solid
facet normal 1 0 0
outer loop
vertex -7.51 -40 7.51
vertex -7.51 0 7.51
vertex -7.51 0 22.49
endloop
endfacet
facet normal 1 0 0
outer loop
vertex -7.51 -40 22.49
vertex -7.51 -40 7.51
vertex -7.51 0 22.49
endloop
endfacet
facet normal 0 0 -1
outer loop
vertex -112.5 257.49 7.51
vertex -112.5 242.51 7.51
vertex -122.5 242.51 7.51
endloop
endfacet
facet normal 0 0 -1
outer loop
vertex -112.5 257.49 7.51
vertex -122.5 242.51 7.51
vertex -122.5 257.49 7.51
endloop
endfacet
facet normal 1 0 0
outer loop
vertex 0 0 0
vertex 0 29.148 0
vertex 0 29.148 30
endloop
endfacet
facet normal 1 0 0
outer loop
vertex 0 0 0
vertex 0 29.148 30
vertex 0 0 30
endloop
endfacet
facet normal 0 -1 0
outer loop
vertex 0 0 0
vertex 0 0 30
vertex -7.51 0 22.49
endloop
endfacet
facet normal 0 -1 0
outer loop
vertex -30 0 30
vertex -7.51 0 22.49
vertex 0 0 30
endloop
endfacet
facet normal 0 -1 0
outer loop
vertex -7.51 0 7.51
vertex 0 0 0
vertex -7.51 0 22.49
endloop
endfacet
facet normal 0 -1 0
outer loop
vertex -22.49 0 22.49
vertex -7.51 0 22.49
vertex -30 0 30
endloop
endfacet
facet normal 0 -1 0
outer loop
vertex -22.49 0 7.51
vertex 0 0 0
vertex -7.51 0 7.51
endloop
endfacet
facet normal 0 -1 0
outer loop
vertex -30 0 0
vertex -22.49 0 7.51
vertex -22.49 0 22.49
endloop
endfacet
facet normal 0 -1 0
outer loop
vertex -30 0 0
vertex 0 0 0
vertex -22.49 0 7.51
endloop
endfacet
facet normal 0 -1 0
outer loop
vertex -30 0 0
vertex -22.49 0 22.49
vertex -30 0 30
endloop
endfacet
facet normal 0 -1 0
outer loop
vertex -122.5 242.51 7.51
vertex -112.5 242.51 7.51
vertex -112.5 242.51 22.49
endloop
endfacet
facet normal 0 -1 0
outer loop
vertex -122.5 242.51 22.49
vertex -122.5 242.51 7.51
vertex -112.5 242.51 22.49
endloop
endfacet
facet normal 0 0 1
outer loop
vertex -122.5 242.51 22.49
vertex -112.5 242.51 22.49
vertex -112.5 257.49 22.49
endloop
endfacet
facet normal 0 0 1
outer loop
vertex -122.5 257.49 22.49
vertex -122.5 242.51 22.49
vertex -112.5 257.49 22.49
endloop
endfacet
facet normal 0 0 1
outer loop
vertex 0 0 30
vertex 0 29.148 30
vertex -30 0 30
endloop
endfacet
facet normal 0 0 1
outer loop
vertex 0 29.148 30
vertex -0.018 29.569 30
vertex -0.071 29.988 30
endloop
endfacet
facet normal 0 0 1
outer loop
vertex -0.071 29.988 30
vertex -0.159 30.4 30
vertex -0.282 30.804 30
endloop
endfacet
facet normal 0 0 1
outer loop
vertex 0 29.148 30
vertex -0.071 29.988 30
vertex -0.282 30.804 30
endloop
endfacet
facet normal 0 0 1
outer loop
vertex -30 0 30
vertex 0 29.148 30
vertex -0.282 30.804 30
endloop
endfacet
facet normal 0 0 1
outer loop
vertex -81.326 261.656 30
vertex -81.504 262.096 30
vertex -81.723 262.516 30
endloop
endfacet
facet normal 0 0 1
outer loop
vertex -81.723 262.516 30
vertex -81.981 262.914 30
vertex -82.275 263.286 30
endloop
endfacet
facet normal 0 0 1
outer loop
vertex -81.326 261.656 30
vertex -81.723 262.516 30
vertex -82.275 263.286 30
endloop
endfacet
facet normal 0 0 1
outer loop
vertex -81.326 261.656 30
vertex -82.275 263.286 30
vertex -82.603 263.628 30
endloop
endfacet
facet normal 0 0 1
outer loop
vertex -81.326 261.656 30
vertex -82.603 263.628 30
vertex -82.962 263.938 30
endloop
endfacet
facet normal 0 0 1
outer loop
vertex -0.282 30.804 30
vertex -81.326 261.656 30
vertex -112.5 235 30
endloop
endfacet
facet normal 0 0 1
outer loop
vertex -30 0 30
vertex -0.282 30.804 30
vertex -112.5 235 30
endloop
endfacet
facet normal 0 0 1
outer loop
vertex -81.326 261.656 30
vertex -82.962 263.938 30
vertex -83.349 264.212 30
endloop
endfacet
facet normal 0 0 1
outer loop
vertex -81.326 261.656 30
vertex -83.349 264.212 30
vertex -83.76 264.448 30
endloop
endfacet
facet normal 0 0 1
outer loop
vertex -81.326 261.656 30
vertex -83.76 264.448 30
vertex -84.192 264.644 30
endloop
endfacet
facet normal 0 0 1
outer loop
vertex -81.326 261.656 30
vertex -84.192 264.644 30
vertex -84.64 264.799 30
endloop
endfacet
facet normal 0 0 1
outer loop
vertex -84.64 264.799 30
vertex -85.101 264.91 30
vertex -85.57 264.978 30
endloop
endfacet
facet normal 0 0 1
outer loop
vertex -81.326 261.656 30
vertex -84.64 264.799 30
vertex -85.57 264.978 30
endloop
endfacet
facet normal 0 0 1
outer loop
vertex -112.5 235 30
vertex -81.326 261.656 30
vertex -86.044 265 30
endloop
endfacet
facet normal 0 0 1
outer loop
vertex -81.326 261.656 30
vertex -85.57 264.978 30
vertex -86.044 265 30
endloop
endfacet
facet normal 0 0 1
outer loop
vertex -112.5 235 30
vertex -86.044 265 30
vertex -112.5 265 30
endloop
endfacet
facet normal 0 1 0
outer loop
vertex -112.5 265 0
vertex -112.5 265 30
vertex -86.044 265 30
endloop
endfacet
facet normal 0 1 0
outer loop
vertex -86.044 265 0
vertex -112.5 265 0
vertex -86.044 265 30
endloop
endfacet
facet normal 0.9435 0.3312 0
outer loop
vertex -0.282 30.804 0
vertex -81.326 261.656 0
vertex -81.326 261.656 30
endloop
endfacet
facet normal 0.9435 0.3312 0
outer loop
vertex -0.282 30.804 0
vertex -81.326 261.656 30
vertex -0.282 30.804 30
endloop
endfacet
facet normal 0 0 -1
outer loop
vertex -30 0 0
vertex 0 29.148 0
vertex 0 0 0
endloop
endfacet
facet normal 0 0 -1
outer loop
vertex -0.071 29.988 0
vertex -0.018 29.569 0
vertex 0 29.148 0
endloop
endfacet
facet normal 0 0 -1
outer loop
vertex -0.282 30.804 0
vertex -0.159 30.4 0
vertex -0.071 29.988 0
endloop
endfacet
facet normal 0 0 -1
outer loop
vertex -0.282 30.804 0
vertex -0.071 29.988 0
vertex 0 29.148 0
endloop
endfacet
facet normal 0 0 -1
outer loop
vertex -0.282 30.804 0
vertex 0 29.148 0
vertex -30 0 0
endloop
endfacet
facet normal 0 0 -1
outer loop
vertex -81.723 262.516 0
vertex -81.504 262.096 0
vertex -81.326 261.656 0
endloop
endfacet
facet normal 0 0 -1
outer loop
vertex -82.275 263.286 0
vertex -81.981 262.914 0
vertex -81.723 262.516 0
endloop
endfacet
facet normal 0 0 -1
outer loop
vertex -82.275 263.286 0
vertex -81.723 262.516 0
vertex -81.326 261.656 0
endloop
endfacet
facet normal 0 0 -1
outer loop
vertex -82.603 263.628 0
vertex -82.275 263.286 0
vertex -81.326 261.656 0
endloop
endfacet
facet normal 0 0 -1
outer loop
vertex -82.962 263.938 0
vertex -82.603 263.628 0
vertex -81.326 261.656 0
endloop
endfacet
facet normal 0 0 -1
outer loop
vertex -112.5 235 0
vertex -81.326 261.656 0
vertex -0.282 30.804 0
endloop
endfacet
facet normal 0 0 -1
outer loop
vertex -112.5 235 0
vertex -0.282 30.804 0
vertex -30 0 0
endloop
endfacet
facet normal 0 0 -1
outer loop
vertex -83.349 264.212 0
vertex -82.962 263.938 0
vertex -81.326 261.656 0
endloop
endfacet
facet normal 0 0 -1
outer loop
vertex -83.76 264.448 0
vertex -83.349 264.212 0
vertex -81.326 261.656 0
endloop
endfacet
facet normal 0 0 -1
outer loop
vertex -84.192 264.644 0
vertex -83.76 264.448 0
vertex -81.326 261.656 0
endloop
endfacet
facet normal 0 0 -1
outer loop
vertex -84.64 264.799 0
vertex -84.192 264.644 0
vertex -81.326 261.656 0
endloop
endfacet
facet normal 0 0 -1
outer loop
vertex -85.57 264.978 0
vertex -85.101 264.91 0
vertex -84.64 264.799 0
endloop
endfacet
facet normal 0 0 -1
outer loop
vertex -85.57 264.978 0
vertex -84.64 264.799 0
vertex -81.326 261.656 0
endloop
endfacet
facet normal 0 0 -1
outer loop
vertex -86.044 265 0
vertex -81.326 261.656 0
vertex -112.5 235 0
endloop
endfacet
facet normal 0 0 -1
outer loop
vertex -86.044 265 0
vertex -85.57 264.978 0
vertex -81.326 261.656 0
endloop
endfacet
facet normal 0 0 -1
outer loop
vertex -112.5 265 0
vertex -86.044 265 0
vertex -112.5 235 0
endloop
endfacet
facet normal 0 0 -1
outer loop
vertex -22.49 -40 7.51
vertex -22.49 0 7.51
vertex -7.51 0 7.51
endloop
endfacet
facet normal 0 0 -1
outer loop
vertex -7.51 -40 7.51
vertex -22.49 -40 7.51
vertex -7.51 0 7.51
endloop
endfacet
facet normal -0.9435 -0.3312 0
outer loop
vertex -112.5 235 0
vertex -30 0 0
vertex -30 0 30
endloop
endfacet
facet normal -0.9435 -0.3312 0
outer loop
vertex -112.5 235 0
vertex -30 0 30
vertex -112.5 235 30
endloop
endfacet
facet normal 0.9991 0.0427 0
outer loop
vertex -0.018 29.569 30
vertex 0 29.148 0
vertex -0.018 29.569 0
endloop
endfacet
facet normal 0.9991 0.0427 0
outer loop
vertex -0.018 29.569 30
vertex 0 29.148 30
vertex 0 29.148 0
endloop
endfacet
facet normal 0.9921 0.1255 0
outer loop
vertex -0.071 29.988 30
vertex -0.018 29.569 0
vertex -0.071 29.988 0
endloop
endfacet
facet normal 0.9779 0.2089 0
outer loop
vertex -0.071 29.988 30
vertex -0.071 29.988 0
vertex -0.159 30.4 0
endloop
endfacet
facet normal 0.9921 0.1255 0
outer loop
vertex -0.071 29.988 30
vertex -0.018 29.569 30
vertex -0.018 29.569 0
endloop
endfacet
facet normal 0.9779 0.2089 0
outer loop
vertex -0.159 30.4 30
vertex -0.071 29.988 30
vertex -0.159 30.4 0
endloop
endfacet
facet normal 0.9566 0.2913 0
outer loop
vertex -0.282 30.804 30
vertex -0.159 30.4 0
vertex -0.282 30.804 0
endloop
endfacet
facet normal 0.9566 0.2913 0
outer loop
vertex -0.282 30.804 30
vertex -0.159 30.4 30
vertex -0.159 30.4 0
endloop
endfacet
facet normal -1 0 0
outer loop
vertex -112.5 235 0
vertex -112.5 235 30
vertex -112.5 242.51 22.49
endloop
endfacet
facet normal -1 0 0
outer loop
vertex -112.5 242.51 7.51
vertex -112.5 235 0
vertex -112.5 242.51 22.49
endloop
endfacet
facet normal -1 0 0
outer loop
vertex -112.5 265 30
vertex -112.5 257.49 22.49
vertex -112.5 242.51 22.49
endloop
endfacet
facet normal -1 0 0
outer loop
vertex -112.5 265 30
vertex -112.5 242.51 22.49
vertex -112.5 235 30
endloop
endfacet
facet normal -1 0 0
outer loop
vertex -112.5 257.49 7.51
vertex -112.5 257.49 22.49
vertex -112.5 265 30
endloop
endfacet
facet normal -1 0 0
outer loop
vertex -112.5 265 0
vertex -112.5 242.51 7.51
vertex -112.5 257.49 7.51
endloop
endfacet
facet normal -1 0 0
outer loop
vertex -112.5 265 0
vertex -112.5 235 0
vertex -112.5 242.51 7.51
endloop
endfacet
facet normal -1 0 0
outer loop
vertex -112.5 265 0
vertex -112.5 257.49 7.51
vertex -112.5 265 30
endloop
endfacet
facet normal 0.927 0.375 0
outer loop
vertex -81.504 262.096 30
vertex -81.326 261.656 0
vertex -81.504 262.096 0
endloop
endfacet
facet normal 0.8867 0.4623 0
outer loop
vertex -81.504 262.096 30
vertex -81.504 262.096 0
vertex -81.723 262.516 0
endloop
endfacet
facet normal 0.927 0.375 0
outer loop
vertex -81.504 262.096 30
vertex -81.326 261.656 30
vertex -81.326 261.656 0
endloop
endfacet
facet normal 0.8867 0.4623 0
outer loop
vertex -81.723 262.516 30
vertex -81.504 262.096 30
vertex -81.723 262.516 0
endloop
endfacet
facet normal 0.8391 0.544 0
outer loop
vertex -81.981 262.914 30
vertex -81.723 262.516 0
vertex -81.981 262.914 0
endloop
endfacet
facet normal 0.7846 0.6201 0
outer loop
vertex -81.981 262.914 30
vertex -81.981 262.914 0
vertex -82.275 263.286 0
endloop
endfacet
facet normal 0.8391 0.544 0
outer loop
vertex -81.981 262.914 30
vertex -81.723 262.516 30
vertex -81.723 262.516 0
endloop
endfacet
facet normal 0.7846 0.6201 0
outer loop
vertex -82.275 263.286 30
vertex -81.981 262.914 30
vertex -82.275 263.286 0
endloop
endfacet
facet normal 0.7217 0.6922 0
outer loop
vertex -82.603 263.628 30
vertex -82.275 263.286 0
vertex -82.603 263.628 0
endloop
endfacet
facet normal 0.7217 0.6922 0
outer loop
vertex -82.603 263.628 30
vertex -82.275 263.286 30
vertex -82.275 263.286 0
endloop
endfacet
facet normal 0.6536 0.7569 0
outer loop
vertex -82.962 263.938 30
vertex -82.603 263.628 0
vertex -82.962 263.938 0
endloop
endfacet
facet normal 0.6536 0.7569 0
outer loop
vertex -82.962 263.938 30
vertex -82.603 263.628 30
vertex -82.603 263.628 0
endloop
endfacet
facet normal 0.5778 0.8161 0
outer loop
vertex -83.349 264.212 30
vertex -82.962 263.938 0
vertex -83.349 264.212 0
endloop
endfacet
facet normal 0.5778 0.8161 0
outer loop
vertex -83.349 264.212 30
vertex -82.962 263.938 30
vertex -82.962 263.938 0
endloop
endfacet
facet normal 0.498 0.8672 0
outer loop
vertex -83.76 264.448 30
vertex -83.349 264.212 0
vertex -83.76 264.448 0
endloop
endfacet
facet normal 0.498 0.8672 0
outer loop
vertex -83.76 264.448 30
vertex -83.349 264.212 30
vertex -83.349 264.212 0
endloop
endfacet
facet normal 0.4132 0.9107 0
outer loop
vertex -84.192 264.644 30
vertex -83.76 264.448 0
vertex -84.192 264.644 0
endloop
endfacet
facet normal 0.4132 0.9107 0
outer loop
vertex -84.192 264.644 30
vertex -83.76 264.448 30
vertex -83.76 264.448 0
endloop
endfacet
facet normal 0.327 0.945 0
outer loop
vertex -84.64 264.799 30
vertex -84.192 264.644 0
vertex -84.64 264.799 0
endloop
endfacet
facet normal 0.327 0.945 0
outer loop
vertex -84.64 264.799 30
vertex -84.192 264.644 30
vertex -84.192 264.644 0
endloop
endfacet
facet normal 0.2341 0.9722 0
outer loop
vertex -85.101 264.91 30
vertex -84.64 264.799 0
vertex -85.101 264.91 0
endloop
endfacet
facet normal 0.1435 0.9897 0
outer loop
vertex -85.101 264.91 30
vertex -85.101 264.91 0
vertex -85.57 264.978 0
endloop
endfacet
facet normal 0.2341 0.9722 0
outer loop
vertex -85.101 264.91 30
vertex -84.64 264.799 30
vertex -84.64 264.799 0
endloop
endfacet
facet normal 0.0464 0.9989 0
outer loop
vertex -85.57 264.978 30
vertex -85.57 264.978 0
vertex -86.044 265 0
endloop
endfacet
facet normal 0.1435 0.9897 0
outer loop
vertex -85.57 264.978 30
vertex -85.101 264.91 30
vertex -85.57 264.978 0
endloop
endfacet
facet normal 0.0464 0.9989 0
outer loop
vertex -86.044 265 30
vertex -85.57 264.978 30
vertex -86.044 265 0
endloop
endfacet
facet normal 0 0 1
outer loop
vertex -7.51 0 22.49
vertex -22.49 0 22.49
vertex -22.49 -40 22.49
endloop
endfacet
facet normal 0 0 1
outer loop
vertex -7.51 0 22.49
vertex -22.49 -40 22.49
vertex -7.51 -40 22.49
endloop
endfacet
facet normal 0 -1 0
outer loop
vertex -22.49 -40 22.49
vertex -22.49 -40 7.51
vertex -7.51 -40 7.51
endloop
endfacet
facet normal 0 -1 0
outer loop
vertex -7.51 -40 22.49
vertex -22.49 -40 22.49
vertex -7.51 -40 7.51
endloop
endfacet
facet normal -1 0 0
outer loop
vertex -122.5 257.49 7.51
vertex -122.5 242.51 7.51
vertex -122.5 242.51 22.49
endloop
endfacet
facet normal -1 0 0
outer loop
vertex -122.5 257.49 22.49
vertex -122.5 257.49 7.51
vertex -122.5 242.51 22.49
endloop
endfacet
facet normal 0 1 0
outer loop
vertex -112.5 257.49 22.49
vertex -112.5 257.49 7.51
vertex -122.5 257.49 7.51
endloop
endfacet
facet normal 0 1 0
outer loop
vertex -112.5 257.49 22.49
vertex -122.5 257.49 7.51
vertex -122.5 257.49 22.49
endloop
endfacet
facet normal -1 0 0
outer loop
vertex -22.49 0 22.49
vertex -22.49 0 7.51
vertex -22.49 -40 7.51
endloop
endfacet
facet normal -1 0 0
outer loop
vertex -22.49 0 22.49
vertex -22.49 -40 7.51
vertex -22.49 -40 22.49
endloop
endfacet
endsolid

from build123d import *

# Parameters (mm, degrees)
BOSS_EXTRUDE1_DEPTH = 30
SKETCH2_W           = 14.98
SKETCH2_H           = 14.98
BOSS_EXTRUDE2_DEPTH = 10
SKETCH3_W           = 14.98
SKETCH3_H           = 14.98
BOSS_EXTRUDE3_DEPTH = 40
FILLET1_R           = 5


with BuildPart() as part:
    # Sketch1 → Boss-Extrude1 (new body)
    with BuildSketch(Plane.XY):
        Polygon((0, 0), (-30, 0), (-112.5, 235), (-112.5, 265), (-82.5, 265), (0, 30), align=None)
    extrude(amount=BOSS_EXTRUDE1_DEPTH)

    # Sketch2 → Boss-Extrude2 (add)
    with BuildSketch(Plane.ZY.offset(112.5)):
        with Locations((15, 250)):
            Rectangle(SKETCH2_W, SKETCH2_H)
    extrude(amount=BOSS_EXTRUDE2_DEPTH)

    # Sketch3 → Boss-Extrude3 (add)
    with BuildSketch(Plane.XZ):
        with Locations((-15, 15)):
            Rectangle(SKETCH3_W, SKETCH3_H)
    extrude(amount=BOSS_EXTRUDE3_DEPTH)

    # Fillet1
    fillet1_edges = [part.edges().sort_by_distance(p)[0] for p in [
        (-82.5, 265, 15),
        (0, 30, 15),
    ]]
    fillet(fillet1_edges, radius=FILLET1_R)


solid = part.part
